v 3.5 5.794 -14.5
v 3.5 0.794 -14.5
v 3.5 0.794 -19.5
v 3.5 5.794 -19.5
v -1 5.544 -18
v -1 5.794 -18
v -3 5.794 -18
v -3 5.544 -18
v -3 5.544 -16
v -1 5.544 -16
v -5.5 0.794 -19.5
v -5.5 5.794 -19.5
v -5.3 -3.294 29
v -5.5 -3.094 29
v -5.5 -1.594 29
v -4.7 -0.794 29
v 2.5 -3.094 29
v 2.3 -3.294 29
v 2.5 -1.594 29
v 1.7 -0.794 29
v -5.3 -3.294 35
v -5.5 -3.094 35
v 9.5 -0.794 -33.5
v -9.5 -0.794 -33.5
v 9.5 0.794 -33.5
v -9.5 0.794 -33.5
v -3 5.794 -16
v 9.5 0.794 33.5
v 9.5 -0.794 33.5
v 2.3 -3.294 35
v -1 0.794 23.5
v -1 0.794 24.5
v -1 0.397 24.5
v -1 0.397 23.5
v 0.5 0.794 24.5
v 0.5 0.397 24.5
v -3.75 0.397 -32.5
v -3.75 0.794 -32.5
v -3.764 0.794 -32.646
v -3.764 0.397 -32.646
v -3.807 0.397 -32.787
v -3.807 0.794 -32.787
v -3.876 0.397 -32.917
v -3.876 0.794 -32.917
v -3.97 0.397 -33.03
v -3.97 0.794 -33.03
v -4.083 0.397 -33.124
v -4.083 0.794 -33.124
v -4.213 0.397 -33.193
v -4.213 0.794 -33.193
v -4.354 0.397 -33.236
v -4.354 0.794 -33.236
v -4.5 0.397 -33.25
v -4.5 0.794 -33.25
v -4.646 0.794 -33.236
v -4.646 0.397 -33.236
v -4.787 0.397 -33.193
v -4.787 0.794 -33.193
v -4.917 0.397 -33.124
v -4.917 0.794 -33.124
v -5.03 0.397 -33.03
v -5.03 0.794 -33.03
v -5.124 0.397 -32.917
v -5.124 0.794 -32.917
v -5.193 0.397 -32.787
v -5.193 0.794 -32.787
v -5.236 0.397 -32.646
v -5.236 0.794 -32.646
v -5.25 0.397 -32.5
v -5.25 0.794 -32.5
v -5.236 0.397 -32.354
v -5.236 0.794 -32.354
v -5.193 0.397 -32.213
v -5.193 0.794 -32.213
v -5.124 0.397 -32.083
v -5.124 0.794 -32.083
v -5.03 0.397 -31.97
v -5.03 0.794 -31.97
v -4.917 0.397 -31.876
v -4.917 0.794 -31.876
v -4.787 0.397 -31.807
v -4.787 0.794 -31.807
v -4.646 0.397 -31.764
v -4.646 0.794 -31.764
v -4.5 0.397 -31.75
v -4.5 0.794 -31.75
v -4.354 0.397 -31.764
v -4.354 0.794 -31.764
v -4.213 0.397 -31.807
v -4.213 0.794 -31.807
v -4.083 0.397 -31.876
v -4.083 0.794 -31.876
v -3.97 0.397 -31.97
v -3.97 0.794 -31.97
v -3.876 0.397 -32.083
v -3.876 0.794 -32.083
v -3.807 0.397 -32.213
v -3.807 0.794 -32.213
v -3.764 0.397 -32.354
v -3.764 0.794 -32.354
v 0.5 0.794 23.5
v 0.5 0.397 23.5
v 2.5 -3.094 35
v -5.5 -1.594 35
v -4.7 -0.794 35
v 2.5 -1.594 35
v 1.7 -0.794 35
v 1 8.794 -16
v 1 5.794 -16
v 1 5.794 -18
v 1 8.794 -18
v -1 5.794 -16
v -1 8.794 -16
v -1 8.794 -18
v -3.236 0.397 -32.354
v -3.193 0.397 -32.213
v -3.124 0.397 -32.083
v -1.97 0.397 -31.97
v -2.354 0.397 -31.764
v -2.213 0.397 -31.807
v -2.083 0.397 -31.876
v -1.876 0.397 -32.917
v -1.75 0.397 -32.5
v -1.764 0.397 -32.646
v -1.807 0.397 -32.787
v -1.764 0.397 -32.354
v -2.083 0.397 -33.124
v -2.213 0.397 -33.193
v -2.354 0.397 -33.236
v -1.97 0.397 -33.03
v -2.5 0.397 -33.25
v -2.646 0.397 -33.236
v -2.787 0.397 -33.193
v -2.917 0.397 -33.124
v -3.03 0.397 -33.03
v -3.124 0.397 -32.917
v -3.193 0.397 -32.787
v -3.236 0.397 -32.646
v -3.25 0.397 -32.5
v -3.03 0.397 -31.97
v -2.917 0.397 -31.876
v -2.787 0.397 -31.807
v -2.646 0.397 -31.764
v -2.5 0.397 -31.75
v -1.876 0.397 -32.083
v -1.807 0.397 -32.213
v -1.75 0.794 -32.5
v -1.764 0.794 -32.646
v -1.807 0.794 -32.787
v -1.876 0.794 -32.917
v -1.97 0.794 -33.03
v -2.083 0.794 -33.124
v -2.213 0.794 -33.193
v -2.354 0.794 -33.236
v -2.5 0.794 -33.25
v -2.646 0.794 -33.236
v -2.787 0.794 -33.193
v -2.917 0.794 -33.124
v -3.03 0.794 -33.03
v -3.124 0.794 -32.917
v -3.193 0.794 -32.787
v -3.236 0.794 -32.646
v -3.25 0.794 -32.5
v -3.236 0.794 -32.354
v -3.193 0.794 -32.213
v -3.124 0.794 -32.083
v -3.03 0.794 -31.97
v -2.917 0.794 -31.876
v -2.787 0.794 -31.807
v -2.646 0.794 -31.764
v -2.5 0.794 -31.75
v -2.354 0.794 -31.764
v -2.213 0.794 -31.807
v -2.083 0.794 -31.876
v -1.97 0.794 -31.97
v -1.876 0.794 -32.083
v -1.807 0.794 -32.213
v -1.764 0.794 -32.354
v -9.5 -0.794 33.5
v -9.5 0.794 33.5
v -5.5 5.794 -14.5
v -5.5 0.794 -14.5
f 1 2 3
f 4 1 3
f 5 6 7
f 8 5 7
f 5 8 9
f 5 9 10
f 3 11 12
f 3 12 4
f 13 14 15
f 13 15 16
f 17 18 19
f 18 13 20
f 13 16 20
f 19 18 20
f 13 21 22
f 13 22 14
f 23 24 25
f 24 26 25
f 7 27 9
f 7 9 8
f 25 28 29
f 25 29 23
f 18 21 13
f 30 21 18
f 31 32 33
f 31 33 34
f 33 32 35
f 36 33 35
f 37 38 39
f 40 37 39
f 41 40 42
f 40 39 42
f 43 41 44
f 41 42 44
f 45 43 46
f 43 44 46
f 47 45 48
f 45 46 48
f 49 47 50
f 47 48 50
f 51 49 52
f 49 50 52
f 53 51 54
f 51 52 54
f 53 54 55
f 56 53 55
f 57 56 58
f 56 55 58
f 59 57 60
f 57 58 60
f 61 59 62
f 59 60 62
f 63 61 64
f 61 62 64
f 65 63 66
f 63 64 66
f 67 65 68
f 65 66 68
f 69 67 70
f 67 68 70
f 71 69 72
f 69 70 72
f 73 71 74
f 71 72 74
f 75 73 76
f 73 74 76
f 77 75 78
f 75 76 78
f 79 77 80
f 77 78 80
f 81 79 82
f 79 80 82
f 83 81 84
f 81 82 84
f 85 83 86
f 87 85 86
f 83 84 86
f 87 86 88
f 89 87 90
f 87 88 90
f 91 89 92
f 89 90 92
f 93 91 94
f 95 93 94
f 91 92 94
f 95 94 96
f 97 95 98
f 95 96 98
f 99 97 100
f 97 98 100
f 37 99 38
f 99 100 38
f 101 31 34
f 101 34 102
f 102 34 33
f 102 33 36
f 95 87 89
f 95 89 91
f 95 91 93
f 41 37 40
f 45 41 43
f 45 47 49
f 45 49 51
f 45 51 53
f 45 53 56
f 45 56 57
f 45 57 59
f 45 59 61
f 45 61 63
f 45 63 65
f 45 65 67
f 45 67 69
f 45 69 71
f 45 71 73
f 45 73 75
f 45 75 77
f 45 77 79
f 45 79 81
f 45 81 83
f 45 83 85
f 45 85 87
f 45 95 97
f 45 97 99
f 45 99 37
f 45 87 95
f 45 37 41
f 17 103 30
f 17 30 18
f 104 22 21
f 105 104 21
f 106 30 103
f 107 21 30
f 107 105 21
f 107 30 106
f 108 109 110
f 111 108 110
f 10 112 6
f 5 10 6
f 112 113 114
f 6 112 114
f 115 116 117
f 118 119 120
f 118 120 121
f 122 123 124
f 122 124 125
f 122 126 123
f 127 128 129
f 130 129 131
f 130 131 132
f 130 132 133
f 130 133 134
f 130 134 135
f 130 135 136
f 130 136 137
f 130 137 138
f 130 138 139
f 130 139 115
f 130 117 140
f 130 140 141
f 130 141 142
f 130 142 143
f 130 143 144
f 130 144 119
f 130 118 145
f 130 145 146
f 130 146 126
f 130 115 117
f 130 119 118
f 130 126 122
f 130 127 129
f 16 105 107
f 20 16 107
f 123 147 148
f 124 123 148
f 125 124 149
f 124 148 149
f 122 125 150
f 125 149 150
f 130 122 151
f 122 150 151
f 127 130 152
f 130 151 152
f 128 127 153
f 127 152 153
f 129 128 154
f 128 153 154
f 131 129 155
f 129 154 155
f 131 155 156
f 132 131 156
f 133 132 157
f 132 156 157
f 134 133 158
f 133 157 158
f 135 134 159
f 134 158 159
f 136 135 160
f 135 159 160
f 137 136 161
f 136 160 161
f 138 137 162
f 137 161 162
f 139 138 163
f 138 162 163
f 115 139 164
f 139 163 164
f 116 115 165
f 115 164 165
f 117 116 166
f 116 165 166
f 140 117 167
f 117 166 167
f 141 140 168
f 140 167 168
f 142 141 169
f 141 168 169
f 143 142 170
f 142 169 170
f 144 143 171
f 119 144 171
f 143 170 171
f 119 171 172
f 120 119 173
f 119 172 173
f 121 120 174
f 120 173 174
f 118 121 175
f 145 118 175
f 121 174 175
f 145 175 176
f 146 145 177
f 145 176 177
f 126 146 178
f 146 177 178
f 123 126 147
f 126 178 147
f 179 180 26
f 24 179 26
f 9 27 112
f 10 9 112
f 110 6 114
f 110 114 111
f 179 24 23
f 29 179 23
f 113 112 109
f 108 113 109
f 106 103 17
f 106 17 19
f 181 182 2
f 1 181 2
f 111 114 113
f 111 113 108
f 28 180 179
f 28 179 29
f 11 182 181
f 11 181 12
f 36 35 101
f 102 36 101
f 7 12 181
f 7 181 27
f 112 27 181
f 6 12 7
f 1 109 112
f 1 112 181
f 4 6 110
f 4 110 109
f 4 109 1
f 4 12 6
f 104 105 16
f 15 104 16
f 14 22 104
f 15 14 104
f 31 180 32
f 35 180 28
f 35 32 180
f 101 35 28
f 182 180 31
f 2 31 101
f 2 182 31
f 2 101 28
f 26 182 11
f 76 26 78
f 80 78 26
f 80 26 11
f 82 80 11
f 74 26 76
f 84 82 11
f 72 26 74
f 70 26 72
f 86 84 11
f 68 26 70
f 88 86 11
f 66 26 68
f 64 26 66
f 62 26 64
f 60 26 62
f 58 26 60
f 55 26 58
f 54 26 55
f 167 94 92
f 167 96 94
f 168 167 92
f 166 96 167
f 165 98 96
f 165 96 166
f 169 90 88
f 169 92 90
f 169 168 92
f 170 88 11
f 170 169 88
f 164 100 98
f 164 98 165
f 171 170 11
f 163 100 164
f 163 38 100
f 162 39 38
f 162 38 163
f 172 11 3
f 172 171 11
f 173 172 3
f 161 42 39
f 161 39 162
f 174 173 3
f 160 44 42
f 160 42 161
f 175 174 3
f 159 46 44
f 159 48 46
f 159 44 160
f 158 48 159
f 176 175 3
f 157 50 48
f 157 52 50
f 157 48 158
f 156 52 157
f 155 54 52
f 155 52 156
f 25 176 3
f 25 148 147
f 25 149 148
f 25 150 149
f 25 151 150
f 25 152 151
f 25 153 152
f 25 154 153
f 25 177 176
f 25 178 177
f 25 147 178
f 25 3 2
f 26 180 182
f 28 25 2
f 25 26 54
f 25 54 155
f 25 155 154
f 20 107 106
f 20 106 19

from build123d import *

# Parameters (mm, degrees)
SKETCH1_W                = 19
SKETCH1_H                = 67
BOSS_EXTRUDE1_DEPTH      = 0.79375
SKETCH3_W                = 9
SKETCH3_H                = 5
BOSS_EXTRUDE2_DEPTH      = 5
SKETCH4_W                = 2
SKETCH4_H                = 2
CUT_EXTRUDE2_DEPTH       = 0.25
SKETCH4_3_W              = 2
SKETCH4_3_H              = 2
BOSS_EXTRUDE3_DEPTH      = 3
BOSS_EXTRUDE3_DEPTH_BACK = 6.5875
SKETCH5_W                = 8
SKETCH5_H                = 2.5
BOSS_EXTRUDE4_DEPTH      = 6
SKETCH2_R                = 0.75
SKETCH2_W                = 1.5
SKETCH2_H                = 1
CUT_EXTRUDE1_DEPTH       = 0.396875
CHAMFER1_SIZE            = 0.8
CHAMFER2_SIZE            = 0.2


with BuildPart() as part:
    # Sketch1 → Boss-Extrude1 (new body, symmetric)
    with BuildSketch(Plane(origin=(0, 0, 0), x_dir=(1, 0, 0), z_dir=(0, 1, 0))):
        Rectangle(SKETCH1_W, SKETCH1_H)
    extrude(amount=BOSS_EXTRUDE1_DEPTH, both=True)

    # Sketch3 → Boss-Extrude2 (add)
    with BuildSketch(Plane(origin=(0, 0.79375, 0), x_dir=(1, 0, 0), z_dir=(0, 1, 0))):
        with Locations((-1, 17)):
            Rectangle(SKETCH3_W, SKETCH3_H)
    extrude(amount=BOSS_EXTRUDE2_DEPTH)

    # Sketch4 → Cut-Extrude2 (cut)
    with BuildSketch(Plane(origin=(0, 5.79375, 0), x_dir=(1, 0, 0), z_dir=(0, 1, 0))):
        with Locations((-2, 17)):
            Rectangle(SKETCH4_W, SKETCH4_H)
        with Locations((0, 17)):
            Rectangle(SKETCH4_W, SKETCH4_H)
    extrude(amount=-CUT_EXTRUDE2_DEPTH, mode=Mode.SUBTRACT)

    # Sketch4<3> → Boss-Extrude3 (add, two sides)
    with BuildSketch(Plane(origin=(0, 5.79375, 0), x_dir=(1, 0, 0), z_dir=(0, 1, 0))) as boss_extrude3_sk:
        with Locations((0, 17)):
            Rectangle(SKETCH4_3_W, SKETCH4_3_H)
    extrude(amount=BOSS_EXTRUDE3_DEPTH)
    extrude(boss_extrude3_sk.sketch, amount=-BOSS_EXTRUDE3_DEPTH_BACK)

    # Sketch2 → Cut-Extrude1 (cut)
    with BuildSketch(Plane(origin=(0, 0.79375, 0), x_dir=(1, 0, 0), z_dir=(0, 1, 0))):
        with Locations((-4.5, 32.5)):
            Circle(SKETCH2_R)
        with Locations((-2.5, 32.5)):
            Circle(SKETCH2_R)
        with Locations((-0.25, -24)):
            Rectangle(SKETCH2_W, SKETCH2_H)
    extrude(amount=-CUT_EXTRUDE1_DEPTH, mode=Mode.SUBTRACT)


with BuildPart() as body_2:
    # Sketch5 → Boss-Extrude4 (new body)
    with BuildSketch(Plane.XY.offset(35)):
        with Locations((-1.5, -2.04375)):
            Rectangle(SKETCH5_W, SKETCH5_H)
    extrude(amount=-BOSS_EXTRUDE4_DEPTH)

    # Chamfer1
    chamfer1_edges = [body_2.edges().sort_by_distance(p)[0] for p in [
        (-5.5, -0.79375, 32),
        (2.5, -0.79375, 32),
    ]]
    chamfer(chamfer1_edges, length=CHAMFER1_SIZE)

    # Chamfer2
    chamfer2_edges = [body_2.edges().sort_by_distance(p)[0] for p in [
        (2.5, -3.29375, 32),
        (-5.5, -3.29375, 32),
    ]]
    chamfer(chamfer2_edges, length=CHAMFER2_SIZE)


solid = Compound([part.part, body_2.part])
